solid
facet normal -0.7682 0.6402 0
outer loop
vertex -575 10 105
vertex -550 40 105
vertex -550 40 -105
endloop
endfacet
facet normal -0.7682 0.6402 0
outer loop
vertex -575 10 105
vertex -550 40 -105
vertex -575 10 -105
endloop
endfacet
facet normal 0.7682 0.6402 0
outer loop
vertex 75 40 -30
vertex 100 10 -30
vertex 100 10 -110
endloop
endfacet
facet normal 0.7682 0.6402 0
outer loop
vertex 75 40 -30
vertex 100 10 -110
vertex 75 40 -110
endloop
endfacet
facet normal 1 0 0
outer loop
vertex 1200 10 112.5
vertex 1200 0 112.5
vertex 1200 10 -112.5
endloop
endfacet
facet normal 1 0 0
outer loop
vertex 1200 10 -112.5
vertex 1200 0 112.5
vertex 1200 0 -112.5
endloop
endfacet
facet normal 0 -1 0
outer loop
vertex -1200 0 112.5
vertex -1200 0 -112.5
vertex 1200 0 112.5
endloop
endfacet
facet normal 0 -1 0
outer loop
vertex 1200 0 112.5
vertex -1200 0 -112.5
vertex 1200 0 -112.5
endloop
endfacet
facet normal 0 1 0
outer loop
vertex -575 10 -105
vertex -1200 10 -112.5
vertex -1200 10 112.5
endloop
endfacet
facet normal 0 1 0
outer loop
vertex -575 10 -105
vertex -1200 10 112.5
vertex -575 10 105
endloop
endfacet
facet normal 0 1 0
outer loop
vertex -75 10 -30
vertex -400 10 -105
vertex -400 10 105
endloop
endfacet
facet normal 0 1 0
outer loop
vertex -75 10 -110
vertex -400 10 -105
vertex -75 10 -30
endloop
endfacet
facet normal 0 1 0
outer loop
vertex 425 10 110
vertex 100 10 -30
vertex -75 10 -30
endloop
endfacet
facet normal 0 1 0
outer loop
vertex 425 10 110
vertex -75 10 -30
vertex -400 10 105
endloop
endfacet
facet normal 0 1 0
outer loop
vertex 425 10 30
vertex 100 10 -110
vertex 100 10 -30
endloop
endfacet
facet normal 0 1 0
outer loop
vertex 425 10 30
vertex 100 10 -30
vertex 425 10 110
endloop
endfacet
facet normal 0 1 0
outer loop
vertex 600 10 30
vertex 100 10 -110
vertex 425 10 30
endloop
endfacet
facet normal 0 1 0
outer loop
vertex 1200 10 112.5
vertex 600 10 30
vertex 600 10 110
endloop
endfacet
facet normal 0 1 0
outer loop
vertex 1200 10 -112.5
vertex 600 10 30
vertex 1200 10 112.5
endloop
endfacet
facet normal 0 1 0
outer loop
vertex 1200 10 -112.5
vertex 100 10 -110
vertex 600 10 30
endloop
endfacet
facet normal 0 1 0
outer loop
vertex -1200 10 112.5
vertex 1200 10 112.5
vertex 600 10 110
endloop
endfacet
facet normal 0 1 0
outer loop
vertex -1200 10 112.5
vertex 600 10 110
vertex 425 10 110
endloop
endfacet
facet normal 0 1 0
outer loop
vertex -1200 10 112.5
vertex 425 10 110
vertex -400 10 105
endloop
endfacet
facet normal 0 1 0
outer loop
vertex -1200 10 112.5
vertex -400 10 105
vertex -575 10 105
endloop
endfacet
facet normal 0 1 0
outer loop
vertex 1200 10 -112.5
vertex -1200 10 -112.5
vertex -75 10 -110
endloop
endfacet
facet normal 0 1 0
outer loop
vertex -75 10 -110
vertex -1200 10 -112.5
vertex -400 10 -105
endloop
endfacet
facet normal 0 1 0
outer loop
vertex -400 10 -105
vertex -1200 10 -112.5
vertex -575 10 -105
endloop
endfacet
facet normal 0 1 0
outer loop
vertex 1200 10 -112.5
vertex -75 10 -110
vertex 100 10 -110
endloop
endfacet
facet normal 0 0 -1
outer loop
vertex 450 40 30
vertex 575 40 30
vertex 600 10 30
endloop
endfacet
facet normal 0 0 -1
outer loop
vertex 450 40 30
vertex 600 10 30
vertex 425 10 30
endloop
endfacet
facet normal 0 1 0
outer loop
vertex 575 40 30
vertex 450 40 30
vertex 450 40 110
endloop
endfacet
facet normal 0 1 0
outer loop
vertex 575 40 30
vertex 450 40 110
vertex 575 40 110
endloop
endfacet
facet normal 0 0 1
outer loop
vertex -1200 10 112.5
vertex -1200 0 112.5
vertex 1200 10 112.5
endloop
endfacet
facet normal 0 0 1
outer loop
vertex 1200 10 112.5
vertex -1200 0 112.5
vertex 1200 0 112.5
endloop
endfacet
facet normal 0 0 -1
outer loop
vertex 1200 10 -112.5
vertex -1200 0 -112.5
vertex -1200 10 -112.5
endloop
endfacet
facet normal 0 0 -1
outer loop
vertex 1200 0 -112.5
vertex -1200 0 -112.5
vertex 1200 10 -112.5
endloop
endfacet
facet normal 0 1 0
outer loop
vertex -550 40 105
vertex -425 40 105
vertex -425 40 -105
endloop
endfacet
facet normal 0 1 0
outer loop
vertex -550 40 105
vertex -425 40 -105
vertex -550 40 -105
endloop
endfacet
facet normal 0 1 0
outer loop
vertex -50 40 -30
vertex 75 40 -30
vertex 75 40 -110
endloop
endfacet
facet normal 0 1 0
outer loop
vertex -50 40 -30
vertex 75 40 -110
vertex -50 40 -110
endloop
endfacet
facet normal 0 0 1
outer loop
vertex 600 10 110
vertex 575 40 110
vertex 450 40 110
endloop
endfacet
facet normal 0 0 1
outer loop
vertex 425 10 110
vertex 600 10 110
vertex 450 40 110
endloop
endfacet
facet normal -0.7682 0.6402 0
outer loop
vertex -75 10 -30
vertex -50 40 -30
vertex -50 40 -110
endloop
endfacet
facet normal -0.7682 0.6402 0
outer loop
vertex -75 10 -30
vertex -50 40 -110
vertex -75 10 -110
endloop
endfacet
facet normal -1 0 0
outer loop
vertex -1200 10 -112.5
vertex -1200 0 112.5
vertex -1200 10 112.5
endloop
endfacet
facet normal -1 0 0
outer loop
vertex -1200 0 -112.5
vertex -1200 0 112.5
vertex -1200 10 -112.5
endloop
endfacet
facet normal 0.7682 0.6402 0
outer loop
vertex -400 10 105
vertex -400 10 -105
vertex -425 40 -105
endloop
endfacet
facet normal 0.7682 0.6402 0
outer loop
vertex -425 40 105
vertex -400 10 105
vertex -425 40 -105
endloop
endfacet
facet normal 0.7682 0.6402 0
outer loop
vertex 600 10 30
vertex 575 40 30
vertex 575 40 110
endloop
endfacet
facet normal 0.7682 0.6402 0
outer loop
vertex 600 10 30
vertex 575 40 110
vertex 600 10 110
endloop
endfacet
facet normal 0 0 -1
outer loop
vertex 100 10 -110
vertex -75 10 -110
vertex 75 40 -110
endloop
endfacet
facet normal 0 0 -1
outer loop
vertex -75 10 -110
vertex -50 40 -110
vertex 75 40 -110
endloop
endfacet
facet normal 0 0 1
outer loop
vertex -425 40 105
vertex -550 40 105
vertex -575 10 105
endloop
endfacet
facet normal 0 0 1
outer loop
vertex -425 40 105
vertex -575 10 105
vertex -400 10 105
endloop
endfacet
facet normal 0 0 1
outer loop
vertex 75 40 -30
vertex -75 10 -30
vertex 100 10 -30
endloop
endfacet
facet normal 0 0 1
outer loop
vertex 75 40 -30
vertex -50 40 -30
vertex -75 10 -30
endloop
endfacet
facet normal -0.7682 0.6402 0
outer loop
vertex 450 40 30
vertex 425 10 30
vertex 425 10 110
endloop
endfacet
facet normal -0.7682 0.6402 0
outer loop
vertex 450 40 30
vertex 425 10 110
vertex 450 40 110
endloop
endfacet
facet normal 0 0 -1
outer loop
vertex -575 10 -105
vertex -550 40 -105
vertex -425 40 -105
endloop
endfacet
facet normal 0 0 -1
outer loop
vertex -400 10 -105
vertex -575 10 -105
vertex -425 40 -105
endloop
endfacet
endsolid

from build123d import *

# Parameters (mm, degrees)
SKETCH1_W                = 2400
SKETCH1_H                = 225
BOSS_EXTRUDE1_DEPTH      = 10
BOSS_EXTRUDE4_START      = 30
BOSS_EXTRUDE4_DEPTH      = 80
BOSS_EXTRUDE5_START      = -30
BOSS_EXTRUDE5_DEPTH      = 80
BOSS_EXTRUDE6_DEPTH      = 105
BOSS_EXTRUDE6_DEPTH_BACK = 105


with BuildPart() as part:
    # Sketch1 → Boss-Extrude1 (new body)
    with BuildSketch(Plane(origin=(0, 0, 0), x_dir=(1, 0, 0), z_dir=(0, 1, 0))):
        Rectangle(SKETCH1_W, SKETCH1_H)
    extrude(amount=BOSS_EXTRUDE1_DEPTH)

    # Sketch8 → Boss-Extrude4 (add)
    with BuildSketch(Plane.XY.offset(BOSS_EXTRUDE4_START)):
        Polygon((425, 10), (450, 40), (575, 40), (600, 10), align=None)
    extrude(amount=BOSS_EXTRUDE4_DEPTH)

    # Sketch14 → Boss-Extrude5 (add)
    with BuildSketch(Plane.XY.offset(BOSS_EXTRUDE5_START)):
        Polygon((-75, 10), (100, 10), (75, 40), (-50, 40), align=None)
    extrude(amount=-BOSS_EXTRUDE5_DEPTH)

    # Sketch15 → Boss-Extrude6 (add, two sides)
    with BuildSketch(Plane.XY) as boss_extrude6_sk:
        Polygon((-400, 10), (-425, 40), (-550, 40), (-575, 10), align=None)
    extrude(amount=BOSS_EXTRUDE6_DEPTH)
    extrude(boss_extrude6_sk.sketch, amount=-BOSS_EXTRUDE6_DEPTH_BACK)


solid = part.part
